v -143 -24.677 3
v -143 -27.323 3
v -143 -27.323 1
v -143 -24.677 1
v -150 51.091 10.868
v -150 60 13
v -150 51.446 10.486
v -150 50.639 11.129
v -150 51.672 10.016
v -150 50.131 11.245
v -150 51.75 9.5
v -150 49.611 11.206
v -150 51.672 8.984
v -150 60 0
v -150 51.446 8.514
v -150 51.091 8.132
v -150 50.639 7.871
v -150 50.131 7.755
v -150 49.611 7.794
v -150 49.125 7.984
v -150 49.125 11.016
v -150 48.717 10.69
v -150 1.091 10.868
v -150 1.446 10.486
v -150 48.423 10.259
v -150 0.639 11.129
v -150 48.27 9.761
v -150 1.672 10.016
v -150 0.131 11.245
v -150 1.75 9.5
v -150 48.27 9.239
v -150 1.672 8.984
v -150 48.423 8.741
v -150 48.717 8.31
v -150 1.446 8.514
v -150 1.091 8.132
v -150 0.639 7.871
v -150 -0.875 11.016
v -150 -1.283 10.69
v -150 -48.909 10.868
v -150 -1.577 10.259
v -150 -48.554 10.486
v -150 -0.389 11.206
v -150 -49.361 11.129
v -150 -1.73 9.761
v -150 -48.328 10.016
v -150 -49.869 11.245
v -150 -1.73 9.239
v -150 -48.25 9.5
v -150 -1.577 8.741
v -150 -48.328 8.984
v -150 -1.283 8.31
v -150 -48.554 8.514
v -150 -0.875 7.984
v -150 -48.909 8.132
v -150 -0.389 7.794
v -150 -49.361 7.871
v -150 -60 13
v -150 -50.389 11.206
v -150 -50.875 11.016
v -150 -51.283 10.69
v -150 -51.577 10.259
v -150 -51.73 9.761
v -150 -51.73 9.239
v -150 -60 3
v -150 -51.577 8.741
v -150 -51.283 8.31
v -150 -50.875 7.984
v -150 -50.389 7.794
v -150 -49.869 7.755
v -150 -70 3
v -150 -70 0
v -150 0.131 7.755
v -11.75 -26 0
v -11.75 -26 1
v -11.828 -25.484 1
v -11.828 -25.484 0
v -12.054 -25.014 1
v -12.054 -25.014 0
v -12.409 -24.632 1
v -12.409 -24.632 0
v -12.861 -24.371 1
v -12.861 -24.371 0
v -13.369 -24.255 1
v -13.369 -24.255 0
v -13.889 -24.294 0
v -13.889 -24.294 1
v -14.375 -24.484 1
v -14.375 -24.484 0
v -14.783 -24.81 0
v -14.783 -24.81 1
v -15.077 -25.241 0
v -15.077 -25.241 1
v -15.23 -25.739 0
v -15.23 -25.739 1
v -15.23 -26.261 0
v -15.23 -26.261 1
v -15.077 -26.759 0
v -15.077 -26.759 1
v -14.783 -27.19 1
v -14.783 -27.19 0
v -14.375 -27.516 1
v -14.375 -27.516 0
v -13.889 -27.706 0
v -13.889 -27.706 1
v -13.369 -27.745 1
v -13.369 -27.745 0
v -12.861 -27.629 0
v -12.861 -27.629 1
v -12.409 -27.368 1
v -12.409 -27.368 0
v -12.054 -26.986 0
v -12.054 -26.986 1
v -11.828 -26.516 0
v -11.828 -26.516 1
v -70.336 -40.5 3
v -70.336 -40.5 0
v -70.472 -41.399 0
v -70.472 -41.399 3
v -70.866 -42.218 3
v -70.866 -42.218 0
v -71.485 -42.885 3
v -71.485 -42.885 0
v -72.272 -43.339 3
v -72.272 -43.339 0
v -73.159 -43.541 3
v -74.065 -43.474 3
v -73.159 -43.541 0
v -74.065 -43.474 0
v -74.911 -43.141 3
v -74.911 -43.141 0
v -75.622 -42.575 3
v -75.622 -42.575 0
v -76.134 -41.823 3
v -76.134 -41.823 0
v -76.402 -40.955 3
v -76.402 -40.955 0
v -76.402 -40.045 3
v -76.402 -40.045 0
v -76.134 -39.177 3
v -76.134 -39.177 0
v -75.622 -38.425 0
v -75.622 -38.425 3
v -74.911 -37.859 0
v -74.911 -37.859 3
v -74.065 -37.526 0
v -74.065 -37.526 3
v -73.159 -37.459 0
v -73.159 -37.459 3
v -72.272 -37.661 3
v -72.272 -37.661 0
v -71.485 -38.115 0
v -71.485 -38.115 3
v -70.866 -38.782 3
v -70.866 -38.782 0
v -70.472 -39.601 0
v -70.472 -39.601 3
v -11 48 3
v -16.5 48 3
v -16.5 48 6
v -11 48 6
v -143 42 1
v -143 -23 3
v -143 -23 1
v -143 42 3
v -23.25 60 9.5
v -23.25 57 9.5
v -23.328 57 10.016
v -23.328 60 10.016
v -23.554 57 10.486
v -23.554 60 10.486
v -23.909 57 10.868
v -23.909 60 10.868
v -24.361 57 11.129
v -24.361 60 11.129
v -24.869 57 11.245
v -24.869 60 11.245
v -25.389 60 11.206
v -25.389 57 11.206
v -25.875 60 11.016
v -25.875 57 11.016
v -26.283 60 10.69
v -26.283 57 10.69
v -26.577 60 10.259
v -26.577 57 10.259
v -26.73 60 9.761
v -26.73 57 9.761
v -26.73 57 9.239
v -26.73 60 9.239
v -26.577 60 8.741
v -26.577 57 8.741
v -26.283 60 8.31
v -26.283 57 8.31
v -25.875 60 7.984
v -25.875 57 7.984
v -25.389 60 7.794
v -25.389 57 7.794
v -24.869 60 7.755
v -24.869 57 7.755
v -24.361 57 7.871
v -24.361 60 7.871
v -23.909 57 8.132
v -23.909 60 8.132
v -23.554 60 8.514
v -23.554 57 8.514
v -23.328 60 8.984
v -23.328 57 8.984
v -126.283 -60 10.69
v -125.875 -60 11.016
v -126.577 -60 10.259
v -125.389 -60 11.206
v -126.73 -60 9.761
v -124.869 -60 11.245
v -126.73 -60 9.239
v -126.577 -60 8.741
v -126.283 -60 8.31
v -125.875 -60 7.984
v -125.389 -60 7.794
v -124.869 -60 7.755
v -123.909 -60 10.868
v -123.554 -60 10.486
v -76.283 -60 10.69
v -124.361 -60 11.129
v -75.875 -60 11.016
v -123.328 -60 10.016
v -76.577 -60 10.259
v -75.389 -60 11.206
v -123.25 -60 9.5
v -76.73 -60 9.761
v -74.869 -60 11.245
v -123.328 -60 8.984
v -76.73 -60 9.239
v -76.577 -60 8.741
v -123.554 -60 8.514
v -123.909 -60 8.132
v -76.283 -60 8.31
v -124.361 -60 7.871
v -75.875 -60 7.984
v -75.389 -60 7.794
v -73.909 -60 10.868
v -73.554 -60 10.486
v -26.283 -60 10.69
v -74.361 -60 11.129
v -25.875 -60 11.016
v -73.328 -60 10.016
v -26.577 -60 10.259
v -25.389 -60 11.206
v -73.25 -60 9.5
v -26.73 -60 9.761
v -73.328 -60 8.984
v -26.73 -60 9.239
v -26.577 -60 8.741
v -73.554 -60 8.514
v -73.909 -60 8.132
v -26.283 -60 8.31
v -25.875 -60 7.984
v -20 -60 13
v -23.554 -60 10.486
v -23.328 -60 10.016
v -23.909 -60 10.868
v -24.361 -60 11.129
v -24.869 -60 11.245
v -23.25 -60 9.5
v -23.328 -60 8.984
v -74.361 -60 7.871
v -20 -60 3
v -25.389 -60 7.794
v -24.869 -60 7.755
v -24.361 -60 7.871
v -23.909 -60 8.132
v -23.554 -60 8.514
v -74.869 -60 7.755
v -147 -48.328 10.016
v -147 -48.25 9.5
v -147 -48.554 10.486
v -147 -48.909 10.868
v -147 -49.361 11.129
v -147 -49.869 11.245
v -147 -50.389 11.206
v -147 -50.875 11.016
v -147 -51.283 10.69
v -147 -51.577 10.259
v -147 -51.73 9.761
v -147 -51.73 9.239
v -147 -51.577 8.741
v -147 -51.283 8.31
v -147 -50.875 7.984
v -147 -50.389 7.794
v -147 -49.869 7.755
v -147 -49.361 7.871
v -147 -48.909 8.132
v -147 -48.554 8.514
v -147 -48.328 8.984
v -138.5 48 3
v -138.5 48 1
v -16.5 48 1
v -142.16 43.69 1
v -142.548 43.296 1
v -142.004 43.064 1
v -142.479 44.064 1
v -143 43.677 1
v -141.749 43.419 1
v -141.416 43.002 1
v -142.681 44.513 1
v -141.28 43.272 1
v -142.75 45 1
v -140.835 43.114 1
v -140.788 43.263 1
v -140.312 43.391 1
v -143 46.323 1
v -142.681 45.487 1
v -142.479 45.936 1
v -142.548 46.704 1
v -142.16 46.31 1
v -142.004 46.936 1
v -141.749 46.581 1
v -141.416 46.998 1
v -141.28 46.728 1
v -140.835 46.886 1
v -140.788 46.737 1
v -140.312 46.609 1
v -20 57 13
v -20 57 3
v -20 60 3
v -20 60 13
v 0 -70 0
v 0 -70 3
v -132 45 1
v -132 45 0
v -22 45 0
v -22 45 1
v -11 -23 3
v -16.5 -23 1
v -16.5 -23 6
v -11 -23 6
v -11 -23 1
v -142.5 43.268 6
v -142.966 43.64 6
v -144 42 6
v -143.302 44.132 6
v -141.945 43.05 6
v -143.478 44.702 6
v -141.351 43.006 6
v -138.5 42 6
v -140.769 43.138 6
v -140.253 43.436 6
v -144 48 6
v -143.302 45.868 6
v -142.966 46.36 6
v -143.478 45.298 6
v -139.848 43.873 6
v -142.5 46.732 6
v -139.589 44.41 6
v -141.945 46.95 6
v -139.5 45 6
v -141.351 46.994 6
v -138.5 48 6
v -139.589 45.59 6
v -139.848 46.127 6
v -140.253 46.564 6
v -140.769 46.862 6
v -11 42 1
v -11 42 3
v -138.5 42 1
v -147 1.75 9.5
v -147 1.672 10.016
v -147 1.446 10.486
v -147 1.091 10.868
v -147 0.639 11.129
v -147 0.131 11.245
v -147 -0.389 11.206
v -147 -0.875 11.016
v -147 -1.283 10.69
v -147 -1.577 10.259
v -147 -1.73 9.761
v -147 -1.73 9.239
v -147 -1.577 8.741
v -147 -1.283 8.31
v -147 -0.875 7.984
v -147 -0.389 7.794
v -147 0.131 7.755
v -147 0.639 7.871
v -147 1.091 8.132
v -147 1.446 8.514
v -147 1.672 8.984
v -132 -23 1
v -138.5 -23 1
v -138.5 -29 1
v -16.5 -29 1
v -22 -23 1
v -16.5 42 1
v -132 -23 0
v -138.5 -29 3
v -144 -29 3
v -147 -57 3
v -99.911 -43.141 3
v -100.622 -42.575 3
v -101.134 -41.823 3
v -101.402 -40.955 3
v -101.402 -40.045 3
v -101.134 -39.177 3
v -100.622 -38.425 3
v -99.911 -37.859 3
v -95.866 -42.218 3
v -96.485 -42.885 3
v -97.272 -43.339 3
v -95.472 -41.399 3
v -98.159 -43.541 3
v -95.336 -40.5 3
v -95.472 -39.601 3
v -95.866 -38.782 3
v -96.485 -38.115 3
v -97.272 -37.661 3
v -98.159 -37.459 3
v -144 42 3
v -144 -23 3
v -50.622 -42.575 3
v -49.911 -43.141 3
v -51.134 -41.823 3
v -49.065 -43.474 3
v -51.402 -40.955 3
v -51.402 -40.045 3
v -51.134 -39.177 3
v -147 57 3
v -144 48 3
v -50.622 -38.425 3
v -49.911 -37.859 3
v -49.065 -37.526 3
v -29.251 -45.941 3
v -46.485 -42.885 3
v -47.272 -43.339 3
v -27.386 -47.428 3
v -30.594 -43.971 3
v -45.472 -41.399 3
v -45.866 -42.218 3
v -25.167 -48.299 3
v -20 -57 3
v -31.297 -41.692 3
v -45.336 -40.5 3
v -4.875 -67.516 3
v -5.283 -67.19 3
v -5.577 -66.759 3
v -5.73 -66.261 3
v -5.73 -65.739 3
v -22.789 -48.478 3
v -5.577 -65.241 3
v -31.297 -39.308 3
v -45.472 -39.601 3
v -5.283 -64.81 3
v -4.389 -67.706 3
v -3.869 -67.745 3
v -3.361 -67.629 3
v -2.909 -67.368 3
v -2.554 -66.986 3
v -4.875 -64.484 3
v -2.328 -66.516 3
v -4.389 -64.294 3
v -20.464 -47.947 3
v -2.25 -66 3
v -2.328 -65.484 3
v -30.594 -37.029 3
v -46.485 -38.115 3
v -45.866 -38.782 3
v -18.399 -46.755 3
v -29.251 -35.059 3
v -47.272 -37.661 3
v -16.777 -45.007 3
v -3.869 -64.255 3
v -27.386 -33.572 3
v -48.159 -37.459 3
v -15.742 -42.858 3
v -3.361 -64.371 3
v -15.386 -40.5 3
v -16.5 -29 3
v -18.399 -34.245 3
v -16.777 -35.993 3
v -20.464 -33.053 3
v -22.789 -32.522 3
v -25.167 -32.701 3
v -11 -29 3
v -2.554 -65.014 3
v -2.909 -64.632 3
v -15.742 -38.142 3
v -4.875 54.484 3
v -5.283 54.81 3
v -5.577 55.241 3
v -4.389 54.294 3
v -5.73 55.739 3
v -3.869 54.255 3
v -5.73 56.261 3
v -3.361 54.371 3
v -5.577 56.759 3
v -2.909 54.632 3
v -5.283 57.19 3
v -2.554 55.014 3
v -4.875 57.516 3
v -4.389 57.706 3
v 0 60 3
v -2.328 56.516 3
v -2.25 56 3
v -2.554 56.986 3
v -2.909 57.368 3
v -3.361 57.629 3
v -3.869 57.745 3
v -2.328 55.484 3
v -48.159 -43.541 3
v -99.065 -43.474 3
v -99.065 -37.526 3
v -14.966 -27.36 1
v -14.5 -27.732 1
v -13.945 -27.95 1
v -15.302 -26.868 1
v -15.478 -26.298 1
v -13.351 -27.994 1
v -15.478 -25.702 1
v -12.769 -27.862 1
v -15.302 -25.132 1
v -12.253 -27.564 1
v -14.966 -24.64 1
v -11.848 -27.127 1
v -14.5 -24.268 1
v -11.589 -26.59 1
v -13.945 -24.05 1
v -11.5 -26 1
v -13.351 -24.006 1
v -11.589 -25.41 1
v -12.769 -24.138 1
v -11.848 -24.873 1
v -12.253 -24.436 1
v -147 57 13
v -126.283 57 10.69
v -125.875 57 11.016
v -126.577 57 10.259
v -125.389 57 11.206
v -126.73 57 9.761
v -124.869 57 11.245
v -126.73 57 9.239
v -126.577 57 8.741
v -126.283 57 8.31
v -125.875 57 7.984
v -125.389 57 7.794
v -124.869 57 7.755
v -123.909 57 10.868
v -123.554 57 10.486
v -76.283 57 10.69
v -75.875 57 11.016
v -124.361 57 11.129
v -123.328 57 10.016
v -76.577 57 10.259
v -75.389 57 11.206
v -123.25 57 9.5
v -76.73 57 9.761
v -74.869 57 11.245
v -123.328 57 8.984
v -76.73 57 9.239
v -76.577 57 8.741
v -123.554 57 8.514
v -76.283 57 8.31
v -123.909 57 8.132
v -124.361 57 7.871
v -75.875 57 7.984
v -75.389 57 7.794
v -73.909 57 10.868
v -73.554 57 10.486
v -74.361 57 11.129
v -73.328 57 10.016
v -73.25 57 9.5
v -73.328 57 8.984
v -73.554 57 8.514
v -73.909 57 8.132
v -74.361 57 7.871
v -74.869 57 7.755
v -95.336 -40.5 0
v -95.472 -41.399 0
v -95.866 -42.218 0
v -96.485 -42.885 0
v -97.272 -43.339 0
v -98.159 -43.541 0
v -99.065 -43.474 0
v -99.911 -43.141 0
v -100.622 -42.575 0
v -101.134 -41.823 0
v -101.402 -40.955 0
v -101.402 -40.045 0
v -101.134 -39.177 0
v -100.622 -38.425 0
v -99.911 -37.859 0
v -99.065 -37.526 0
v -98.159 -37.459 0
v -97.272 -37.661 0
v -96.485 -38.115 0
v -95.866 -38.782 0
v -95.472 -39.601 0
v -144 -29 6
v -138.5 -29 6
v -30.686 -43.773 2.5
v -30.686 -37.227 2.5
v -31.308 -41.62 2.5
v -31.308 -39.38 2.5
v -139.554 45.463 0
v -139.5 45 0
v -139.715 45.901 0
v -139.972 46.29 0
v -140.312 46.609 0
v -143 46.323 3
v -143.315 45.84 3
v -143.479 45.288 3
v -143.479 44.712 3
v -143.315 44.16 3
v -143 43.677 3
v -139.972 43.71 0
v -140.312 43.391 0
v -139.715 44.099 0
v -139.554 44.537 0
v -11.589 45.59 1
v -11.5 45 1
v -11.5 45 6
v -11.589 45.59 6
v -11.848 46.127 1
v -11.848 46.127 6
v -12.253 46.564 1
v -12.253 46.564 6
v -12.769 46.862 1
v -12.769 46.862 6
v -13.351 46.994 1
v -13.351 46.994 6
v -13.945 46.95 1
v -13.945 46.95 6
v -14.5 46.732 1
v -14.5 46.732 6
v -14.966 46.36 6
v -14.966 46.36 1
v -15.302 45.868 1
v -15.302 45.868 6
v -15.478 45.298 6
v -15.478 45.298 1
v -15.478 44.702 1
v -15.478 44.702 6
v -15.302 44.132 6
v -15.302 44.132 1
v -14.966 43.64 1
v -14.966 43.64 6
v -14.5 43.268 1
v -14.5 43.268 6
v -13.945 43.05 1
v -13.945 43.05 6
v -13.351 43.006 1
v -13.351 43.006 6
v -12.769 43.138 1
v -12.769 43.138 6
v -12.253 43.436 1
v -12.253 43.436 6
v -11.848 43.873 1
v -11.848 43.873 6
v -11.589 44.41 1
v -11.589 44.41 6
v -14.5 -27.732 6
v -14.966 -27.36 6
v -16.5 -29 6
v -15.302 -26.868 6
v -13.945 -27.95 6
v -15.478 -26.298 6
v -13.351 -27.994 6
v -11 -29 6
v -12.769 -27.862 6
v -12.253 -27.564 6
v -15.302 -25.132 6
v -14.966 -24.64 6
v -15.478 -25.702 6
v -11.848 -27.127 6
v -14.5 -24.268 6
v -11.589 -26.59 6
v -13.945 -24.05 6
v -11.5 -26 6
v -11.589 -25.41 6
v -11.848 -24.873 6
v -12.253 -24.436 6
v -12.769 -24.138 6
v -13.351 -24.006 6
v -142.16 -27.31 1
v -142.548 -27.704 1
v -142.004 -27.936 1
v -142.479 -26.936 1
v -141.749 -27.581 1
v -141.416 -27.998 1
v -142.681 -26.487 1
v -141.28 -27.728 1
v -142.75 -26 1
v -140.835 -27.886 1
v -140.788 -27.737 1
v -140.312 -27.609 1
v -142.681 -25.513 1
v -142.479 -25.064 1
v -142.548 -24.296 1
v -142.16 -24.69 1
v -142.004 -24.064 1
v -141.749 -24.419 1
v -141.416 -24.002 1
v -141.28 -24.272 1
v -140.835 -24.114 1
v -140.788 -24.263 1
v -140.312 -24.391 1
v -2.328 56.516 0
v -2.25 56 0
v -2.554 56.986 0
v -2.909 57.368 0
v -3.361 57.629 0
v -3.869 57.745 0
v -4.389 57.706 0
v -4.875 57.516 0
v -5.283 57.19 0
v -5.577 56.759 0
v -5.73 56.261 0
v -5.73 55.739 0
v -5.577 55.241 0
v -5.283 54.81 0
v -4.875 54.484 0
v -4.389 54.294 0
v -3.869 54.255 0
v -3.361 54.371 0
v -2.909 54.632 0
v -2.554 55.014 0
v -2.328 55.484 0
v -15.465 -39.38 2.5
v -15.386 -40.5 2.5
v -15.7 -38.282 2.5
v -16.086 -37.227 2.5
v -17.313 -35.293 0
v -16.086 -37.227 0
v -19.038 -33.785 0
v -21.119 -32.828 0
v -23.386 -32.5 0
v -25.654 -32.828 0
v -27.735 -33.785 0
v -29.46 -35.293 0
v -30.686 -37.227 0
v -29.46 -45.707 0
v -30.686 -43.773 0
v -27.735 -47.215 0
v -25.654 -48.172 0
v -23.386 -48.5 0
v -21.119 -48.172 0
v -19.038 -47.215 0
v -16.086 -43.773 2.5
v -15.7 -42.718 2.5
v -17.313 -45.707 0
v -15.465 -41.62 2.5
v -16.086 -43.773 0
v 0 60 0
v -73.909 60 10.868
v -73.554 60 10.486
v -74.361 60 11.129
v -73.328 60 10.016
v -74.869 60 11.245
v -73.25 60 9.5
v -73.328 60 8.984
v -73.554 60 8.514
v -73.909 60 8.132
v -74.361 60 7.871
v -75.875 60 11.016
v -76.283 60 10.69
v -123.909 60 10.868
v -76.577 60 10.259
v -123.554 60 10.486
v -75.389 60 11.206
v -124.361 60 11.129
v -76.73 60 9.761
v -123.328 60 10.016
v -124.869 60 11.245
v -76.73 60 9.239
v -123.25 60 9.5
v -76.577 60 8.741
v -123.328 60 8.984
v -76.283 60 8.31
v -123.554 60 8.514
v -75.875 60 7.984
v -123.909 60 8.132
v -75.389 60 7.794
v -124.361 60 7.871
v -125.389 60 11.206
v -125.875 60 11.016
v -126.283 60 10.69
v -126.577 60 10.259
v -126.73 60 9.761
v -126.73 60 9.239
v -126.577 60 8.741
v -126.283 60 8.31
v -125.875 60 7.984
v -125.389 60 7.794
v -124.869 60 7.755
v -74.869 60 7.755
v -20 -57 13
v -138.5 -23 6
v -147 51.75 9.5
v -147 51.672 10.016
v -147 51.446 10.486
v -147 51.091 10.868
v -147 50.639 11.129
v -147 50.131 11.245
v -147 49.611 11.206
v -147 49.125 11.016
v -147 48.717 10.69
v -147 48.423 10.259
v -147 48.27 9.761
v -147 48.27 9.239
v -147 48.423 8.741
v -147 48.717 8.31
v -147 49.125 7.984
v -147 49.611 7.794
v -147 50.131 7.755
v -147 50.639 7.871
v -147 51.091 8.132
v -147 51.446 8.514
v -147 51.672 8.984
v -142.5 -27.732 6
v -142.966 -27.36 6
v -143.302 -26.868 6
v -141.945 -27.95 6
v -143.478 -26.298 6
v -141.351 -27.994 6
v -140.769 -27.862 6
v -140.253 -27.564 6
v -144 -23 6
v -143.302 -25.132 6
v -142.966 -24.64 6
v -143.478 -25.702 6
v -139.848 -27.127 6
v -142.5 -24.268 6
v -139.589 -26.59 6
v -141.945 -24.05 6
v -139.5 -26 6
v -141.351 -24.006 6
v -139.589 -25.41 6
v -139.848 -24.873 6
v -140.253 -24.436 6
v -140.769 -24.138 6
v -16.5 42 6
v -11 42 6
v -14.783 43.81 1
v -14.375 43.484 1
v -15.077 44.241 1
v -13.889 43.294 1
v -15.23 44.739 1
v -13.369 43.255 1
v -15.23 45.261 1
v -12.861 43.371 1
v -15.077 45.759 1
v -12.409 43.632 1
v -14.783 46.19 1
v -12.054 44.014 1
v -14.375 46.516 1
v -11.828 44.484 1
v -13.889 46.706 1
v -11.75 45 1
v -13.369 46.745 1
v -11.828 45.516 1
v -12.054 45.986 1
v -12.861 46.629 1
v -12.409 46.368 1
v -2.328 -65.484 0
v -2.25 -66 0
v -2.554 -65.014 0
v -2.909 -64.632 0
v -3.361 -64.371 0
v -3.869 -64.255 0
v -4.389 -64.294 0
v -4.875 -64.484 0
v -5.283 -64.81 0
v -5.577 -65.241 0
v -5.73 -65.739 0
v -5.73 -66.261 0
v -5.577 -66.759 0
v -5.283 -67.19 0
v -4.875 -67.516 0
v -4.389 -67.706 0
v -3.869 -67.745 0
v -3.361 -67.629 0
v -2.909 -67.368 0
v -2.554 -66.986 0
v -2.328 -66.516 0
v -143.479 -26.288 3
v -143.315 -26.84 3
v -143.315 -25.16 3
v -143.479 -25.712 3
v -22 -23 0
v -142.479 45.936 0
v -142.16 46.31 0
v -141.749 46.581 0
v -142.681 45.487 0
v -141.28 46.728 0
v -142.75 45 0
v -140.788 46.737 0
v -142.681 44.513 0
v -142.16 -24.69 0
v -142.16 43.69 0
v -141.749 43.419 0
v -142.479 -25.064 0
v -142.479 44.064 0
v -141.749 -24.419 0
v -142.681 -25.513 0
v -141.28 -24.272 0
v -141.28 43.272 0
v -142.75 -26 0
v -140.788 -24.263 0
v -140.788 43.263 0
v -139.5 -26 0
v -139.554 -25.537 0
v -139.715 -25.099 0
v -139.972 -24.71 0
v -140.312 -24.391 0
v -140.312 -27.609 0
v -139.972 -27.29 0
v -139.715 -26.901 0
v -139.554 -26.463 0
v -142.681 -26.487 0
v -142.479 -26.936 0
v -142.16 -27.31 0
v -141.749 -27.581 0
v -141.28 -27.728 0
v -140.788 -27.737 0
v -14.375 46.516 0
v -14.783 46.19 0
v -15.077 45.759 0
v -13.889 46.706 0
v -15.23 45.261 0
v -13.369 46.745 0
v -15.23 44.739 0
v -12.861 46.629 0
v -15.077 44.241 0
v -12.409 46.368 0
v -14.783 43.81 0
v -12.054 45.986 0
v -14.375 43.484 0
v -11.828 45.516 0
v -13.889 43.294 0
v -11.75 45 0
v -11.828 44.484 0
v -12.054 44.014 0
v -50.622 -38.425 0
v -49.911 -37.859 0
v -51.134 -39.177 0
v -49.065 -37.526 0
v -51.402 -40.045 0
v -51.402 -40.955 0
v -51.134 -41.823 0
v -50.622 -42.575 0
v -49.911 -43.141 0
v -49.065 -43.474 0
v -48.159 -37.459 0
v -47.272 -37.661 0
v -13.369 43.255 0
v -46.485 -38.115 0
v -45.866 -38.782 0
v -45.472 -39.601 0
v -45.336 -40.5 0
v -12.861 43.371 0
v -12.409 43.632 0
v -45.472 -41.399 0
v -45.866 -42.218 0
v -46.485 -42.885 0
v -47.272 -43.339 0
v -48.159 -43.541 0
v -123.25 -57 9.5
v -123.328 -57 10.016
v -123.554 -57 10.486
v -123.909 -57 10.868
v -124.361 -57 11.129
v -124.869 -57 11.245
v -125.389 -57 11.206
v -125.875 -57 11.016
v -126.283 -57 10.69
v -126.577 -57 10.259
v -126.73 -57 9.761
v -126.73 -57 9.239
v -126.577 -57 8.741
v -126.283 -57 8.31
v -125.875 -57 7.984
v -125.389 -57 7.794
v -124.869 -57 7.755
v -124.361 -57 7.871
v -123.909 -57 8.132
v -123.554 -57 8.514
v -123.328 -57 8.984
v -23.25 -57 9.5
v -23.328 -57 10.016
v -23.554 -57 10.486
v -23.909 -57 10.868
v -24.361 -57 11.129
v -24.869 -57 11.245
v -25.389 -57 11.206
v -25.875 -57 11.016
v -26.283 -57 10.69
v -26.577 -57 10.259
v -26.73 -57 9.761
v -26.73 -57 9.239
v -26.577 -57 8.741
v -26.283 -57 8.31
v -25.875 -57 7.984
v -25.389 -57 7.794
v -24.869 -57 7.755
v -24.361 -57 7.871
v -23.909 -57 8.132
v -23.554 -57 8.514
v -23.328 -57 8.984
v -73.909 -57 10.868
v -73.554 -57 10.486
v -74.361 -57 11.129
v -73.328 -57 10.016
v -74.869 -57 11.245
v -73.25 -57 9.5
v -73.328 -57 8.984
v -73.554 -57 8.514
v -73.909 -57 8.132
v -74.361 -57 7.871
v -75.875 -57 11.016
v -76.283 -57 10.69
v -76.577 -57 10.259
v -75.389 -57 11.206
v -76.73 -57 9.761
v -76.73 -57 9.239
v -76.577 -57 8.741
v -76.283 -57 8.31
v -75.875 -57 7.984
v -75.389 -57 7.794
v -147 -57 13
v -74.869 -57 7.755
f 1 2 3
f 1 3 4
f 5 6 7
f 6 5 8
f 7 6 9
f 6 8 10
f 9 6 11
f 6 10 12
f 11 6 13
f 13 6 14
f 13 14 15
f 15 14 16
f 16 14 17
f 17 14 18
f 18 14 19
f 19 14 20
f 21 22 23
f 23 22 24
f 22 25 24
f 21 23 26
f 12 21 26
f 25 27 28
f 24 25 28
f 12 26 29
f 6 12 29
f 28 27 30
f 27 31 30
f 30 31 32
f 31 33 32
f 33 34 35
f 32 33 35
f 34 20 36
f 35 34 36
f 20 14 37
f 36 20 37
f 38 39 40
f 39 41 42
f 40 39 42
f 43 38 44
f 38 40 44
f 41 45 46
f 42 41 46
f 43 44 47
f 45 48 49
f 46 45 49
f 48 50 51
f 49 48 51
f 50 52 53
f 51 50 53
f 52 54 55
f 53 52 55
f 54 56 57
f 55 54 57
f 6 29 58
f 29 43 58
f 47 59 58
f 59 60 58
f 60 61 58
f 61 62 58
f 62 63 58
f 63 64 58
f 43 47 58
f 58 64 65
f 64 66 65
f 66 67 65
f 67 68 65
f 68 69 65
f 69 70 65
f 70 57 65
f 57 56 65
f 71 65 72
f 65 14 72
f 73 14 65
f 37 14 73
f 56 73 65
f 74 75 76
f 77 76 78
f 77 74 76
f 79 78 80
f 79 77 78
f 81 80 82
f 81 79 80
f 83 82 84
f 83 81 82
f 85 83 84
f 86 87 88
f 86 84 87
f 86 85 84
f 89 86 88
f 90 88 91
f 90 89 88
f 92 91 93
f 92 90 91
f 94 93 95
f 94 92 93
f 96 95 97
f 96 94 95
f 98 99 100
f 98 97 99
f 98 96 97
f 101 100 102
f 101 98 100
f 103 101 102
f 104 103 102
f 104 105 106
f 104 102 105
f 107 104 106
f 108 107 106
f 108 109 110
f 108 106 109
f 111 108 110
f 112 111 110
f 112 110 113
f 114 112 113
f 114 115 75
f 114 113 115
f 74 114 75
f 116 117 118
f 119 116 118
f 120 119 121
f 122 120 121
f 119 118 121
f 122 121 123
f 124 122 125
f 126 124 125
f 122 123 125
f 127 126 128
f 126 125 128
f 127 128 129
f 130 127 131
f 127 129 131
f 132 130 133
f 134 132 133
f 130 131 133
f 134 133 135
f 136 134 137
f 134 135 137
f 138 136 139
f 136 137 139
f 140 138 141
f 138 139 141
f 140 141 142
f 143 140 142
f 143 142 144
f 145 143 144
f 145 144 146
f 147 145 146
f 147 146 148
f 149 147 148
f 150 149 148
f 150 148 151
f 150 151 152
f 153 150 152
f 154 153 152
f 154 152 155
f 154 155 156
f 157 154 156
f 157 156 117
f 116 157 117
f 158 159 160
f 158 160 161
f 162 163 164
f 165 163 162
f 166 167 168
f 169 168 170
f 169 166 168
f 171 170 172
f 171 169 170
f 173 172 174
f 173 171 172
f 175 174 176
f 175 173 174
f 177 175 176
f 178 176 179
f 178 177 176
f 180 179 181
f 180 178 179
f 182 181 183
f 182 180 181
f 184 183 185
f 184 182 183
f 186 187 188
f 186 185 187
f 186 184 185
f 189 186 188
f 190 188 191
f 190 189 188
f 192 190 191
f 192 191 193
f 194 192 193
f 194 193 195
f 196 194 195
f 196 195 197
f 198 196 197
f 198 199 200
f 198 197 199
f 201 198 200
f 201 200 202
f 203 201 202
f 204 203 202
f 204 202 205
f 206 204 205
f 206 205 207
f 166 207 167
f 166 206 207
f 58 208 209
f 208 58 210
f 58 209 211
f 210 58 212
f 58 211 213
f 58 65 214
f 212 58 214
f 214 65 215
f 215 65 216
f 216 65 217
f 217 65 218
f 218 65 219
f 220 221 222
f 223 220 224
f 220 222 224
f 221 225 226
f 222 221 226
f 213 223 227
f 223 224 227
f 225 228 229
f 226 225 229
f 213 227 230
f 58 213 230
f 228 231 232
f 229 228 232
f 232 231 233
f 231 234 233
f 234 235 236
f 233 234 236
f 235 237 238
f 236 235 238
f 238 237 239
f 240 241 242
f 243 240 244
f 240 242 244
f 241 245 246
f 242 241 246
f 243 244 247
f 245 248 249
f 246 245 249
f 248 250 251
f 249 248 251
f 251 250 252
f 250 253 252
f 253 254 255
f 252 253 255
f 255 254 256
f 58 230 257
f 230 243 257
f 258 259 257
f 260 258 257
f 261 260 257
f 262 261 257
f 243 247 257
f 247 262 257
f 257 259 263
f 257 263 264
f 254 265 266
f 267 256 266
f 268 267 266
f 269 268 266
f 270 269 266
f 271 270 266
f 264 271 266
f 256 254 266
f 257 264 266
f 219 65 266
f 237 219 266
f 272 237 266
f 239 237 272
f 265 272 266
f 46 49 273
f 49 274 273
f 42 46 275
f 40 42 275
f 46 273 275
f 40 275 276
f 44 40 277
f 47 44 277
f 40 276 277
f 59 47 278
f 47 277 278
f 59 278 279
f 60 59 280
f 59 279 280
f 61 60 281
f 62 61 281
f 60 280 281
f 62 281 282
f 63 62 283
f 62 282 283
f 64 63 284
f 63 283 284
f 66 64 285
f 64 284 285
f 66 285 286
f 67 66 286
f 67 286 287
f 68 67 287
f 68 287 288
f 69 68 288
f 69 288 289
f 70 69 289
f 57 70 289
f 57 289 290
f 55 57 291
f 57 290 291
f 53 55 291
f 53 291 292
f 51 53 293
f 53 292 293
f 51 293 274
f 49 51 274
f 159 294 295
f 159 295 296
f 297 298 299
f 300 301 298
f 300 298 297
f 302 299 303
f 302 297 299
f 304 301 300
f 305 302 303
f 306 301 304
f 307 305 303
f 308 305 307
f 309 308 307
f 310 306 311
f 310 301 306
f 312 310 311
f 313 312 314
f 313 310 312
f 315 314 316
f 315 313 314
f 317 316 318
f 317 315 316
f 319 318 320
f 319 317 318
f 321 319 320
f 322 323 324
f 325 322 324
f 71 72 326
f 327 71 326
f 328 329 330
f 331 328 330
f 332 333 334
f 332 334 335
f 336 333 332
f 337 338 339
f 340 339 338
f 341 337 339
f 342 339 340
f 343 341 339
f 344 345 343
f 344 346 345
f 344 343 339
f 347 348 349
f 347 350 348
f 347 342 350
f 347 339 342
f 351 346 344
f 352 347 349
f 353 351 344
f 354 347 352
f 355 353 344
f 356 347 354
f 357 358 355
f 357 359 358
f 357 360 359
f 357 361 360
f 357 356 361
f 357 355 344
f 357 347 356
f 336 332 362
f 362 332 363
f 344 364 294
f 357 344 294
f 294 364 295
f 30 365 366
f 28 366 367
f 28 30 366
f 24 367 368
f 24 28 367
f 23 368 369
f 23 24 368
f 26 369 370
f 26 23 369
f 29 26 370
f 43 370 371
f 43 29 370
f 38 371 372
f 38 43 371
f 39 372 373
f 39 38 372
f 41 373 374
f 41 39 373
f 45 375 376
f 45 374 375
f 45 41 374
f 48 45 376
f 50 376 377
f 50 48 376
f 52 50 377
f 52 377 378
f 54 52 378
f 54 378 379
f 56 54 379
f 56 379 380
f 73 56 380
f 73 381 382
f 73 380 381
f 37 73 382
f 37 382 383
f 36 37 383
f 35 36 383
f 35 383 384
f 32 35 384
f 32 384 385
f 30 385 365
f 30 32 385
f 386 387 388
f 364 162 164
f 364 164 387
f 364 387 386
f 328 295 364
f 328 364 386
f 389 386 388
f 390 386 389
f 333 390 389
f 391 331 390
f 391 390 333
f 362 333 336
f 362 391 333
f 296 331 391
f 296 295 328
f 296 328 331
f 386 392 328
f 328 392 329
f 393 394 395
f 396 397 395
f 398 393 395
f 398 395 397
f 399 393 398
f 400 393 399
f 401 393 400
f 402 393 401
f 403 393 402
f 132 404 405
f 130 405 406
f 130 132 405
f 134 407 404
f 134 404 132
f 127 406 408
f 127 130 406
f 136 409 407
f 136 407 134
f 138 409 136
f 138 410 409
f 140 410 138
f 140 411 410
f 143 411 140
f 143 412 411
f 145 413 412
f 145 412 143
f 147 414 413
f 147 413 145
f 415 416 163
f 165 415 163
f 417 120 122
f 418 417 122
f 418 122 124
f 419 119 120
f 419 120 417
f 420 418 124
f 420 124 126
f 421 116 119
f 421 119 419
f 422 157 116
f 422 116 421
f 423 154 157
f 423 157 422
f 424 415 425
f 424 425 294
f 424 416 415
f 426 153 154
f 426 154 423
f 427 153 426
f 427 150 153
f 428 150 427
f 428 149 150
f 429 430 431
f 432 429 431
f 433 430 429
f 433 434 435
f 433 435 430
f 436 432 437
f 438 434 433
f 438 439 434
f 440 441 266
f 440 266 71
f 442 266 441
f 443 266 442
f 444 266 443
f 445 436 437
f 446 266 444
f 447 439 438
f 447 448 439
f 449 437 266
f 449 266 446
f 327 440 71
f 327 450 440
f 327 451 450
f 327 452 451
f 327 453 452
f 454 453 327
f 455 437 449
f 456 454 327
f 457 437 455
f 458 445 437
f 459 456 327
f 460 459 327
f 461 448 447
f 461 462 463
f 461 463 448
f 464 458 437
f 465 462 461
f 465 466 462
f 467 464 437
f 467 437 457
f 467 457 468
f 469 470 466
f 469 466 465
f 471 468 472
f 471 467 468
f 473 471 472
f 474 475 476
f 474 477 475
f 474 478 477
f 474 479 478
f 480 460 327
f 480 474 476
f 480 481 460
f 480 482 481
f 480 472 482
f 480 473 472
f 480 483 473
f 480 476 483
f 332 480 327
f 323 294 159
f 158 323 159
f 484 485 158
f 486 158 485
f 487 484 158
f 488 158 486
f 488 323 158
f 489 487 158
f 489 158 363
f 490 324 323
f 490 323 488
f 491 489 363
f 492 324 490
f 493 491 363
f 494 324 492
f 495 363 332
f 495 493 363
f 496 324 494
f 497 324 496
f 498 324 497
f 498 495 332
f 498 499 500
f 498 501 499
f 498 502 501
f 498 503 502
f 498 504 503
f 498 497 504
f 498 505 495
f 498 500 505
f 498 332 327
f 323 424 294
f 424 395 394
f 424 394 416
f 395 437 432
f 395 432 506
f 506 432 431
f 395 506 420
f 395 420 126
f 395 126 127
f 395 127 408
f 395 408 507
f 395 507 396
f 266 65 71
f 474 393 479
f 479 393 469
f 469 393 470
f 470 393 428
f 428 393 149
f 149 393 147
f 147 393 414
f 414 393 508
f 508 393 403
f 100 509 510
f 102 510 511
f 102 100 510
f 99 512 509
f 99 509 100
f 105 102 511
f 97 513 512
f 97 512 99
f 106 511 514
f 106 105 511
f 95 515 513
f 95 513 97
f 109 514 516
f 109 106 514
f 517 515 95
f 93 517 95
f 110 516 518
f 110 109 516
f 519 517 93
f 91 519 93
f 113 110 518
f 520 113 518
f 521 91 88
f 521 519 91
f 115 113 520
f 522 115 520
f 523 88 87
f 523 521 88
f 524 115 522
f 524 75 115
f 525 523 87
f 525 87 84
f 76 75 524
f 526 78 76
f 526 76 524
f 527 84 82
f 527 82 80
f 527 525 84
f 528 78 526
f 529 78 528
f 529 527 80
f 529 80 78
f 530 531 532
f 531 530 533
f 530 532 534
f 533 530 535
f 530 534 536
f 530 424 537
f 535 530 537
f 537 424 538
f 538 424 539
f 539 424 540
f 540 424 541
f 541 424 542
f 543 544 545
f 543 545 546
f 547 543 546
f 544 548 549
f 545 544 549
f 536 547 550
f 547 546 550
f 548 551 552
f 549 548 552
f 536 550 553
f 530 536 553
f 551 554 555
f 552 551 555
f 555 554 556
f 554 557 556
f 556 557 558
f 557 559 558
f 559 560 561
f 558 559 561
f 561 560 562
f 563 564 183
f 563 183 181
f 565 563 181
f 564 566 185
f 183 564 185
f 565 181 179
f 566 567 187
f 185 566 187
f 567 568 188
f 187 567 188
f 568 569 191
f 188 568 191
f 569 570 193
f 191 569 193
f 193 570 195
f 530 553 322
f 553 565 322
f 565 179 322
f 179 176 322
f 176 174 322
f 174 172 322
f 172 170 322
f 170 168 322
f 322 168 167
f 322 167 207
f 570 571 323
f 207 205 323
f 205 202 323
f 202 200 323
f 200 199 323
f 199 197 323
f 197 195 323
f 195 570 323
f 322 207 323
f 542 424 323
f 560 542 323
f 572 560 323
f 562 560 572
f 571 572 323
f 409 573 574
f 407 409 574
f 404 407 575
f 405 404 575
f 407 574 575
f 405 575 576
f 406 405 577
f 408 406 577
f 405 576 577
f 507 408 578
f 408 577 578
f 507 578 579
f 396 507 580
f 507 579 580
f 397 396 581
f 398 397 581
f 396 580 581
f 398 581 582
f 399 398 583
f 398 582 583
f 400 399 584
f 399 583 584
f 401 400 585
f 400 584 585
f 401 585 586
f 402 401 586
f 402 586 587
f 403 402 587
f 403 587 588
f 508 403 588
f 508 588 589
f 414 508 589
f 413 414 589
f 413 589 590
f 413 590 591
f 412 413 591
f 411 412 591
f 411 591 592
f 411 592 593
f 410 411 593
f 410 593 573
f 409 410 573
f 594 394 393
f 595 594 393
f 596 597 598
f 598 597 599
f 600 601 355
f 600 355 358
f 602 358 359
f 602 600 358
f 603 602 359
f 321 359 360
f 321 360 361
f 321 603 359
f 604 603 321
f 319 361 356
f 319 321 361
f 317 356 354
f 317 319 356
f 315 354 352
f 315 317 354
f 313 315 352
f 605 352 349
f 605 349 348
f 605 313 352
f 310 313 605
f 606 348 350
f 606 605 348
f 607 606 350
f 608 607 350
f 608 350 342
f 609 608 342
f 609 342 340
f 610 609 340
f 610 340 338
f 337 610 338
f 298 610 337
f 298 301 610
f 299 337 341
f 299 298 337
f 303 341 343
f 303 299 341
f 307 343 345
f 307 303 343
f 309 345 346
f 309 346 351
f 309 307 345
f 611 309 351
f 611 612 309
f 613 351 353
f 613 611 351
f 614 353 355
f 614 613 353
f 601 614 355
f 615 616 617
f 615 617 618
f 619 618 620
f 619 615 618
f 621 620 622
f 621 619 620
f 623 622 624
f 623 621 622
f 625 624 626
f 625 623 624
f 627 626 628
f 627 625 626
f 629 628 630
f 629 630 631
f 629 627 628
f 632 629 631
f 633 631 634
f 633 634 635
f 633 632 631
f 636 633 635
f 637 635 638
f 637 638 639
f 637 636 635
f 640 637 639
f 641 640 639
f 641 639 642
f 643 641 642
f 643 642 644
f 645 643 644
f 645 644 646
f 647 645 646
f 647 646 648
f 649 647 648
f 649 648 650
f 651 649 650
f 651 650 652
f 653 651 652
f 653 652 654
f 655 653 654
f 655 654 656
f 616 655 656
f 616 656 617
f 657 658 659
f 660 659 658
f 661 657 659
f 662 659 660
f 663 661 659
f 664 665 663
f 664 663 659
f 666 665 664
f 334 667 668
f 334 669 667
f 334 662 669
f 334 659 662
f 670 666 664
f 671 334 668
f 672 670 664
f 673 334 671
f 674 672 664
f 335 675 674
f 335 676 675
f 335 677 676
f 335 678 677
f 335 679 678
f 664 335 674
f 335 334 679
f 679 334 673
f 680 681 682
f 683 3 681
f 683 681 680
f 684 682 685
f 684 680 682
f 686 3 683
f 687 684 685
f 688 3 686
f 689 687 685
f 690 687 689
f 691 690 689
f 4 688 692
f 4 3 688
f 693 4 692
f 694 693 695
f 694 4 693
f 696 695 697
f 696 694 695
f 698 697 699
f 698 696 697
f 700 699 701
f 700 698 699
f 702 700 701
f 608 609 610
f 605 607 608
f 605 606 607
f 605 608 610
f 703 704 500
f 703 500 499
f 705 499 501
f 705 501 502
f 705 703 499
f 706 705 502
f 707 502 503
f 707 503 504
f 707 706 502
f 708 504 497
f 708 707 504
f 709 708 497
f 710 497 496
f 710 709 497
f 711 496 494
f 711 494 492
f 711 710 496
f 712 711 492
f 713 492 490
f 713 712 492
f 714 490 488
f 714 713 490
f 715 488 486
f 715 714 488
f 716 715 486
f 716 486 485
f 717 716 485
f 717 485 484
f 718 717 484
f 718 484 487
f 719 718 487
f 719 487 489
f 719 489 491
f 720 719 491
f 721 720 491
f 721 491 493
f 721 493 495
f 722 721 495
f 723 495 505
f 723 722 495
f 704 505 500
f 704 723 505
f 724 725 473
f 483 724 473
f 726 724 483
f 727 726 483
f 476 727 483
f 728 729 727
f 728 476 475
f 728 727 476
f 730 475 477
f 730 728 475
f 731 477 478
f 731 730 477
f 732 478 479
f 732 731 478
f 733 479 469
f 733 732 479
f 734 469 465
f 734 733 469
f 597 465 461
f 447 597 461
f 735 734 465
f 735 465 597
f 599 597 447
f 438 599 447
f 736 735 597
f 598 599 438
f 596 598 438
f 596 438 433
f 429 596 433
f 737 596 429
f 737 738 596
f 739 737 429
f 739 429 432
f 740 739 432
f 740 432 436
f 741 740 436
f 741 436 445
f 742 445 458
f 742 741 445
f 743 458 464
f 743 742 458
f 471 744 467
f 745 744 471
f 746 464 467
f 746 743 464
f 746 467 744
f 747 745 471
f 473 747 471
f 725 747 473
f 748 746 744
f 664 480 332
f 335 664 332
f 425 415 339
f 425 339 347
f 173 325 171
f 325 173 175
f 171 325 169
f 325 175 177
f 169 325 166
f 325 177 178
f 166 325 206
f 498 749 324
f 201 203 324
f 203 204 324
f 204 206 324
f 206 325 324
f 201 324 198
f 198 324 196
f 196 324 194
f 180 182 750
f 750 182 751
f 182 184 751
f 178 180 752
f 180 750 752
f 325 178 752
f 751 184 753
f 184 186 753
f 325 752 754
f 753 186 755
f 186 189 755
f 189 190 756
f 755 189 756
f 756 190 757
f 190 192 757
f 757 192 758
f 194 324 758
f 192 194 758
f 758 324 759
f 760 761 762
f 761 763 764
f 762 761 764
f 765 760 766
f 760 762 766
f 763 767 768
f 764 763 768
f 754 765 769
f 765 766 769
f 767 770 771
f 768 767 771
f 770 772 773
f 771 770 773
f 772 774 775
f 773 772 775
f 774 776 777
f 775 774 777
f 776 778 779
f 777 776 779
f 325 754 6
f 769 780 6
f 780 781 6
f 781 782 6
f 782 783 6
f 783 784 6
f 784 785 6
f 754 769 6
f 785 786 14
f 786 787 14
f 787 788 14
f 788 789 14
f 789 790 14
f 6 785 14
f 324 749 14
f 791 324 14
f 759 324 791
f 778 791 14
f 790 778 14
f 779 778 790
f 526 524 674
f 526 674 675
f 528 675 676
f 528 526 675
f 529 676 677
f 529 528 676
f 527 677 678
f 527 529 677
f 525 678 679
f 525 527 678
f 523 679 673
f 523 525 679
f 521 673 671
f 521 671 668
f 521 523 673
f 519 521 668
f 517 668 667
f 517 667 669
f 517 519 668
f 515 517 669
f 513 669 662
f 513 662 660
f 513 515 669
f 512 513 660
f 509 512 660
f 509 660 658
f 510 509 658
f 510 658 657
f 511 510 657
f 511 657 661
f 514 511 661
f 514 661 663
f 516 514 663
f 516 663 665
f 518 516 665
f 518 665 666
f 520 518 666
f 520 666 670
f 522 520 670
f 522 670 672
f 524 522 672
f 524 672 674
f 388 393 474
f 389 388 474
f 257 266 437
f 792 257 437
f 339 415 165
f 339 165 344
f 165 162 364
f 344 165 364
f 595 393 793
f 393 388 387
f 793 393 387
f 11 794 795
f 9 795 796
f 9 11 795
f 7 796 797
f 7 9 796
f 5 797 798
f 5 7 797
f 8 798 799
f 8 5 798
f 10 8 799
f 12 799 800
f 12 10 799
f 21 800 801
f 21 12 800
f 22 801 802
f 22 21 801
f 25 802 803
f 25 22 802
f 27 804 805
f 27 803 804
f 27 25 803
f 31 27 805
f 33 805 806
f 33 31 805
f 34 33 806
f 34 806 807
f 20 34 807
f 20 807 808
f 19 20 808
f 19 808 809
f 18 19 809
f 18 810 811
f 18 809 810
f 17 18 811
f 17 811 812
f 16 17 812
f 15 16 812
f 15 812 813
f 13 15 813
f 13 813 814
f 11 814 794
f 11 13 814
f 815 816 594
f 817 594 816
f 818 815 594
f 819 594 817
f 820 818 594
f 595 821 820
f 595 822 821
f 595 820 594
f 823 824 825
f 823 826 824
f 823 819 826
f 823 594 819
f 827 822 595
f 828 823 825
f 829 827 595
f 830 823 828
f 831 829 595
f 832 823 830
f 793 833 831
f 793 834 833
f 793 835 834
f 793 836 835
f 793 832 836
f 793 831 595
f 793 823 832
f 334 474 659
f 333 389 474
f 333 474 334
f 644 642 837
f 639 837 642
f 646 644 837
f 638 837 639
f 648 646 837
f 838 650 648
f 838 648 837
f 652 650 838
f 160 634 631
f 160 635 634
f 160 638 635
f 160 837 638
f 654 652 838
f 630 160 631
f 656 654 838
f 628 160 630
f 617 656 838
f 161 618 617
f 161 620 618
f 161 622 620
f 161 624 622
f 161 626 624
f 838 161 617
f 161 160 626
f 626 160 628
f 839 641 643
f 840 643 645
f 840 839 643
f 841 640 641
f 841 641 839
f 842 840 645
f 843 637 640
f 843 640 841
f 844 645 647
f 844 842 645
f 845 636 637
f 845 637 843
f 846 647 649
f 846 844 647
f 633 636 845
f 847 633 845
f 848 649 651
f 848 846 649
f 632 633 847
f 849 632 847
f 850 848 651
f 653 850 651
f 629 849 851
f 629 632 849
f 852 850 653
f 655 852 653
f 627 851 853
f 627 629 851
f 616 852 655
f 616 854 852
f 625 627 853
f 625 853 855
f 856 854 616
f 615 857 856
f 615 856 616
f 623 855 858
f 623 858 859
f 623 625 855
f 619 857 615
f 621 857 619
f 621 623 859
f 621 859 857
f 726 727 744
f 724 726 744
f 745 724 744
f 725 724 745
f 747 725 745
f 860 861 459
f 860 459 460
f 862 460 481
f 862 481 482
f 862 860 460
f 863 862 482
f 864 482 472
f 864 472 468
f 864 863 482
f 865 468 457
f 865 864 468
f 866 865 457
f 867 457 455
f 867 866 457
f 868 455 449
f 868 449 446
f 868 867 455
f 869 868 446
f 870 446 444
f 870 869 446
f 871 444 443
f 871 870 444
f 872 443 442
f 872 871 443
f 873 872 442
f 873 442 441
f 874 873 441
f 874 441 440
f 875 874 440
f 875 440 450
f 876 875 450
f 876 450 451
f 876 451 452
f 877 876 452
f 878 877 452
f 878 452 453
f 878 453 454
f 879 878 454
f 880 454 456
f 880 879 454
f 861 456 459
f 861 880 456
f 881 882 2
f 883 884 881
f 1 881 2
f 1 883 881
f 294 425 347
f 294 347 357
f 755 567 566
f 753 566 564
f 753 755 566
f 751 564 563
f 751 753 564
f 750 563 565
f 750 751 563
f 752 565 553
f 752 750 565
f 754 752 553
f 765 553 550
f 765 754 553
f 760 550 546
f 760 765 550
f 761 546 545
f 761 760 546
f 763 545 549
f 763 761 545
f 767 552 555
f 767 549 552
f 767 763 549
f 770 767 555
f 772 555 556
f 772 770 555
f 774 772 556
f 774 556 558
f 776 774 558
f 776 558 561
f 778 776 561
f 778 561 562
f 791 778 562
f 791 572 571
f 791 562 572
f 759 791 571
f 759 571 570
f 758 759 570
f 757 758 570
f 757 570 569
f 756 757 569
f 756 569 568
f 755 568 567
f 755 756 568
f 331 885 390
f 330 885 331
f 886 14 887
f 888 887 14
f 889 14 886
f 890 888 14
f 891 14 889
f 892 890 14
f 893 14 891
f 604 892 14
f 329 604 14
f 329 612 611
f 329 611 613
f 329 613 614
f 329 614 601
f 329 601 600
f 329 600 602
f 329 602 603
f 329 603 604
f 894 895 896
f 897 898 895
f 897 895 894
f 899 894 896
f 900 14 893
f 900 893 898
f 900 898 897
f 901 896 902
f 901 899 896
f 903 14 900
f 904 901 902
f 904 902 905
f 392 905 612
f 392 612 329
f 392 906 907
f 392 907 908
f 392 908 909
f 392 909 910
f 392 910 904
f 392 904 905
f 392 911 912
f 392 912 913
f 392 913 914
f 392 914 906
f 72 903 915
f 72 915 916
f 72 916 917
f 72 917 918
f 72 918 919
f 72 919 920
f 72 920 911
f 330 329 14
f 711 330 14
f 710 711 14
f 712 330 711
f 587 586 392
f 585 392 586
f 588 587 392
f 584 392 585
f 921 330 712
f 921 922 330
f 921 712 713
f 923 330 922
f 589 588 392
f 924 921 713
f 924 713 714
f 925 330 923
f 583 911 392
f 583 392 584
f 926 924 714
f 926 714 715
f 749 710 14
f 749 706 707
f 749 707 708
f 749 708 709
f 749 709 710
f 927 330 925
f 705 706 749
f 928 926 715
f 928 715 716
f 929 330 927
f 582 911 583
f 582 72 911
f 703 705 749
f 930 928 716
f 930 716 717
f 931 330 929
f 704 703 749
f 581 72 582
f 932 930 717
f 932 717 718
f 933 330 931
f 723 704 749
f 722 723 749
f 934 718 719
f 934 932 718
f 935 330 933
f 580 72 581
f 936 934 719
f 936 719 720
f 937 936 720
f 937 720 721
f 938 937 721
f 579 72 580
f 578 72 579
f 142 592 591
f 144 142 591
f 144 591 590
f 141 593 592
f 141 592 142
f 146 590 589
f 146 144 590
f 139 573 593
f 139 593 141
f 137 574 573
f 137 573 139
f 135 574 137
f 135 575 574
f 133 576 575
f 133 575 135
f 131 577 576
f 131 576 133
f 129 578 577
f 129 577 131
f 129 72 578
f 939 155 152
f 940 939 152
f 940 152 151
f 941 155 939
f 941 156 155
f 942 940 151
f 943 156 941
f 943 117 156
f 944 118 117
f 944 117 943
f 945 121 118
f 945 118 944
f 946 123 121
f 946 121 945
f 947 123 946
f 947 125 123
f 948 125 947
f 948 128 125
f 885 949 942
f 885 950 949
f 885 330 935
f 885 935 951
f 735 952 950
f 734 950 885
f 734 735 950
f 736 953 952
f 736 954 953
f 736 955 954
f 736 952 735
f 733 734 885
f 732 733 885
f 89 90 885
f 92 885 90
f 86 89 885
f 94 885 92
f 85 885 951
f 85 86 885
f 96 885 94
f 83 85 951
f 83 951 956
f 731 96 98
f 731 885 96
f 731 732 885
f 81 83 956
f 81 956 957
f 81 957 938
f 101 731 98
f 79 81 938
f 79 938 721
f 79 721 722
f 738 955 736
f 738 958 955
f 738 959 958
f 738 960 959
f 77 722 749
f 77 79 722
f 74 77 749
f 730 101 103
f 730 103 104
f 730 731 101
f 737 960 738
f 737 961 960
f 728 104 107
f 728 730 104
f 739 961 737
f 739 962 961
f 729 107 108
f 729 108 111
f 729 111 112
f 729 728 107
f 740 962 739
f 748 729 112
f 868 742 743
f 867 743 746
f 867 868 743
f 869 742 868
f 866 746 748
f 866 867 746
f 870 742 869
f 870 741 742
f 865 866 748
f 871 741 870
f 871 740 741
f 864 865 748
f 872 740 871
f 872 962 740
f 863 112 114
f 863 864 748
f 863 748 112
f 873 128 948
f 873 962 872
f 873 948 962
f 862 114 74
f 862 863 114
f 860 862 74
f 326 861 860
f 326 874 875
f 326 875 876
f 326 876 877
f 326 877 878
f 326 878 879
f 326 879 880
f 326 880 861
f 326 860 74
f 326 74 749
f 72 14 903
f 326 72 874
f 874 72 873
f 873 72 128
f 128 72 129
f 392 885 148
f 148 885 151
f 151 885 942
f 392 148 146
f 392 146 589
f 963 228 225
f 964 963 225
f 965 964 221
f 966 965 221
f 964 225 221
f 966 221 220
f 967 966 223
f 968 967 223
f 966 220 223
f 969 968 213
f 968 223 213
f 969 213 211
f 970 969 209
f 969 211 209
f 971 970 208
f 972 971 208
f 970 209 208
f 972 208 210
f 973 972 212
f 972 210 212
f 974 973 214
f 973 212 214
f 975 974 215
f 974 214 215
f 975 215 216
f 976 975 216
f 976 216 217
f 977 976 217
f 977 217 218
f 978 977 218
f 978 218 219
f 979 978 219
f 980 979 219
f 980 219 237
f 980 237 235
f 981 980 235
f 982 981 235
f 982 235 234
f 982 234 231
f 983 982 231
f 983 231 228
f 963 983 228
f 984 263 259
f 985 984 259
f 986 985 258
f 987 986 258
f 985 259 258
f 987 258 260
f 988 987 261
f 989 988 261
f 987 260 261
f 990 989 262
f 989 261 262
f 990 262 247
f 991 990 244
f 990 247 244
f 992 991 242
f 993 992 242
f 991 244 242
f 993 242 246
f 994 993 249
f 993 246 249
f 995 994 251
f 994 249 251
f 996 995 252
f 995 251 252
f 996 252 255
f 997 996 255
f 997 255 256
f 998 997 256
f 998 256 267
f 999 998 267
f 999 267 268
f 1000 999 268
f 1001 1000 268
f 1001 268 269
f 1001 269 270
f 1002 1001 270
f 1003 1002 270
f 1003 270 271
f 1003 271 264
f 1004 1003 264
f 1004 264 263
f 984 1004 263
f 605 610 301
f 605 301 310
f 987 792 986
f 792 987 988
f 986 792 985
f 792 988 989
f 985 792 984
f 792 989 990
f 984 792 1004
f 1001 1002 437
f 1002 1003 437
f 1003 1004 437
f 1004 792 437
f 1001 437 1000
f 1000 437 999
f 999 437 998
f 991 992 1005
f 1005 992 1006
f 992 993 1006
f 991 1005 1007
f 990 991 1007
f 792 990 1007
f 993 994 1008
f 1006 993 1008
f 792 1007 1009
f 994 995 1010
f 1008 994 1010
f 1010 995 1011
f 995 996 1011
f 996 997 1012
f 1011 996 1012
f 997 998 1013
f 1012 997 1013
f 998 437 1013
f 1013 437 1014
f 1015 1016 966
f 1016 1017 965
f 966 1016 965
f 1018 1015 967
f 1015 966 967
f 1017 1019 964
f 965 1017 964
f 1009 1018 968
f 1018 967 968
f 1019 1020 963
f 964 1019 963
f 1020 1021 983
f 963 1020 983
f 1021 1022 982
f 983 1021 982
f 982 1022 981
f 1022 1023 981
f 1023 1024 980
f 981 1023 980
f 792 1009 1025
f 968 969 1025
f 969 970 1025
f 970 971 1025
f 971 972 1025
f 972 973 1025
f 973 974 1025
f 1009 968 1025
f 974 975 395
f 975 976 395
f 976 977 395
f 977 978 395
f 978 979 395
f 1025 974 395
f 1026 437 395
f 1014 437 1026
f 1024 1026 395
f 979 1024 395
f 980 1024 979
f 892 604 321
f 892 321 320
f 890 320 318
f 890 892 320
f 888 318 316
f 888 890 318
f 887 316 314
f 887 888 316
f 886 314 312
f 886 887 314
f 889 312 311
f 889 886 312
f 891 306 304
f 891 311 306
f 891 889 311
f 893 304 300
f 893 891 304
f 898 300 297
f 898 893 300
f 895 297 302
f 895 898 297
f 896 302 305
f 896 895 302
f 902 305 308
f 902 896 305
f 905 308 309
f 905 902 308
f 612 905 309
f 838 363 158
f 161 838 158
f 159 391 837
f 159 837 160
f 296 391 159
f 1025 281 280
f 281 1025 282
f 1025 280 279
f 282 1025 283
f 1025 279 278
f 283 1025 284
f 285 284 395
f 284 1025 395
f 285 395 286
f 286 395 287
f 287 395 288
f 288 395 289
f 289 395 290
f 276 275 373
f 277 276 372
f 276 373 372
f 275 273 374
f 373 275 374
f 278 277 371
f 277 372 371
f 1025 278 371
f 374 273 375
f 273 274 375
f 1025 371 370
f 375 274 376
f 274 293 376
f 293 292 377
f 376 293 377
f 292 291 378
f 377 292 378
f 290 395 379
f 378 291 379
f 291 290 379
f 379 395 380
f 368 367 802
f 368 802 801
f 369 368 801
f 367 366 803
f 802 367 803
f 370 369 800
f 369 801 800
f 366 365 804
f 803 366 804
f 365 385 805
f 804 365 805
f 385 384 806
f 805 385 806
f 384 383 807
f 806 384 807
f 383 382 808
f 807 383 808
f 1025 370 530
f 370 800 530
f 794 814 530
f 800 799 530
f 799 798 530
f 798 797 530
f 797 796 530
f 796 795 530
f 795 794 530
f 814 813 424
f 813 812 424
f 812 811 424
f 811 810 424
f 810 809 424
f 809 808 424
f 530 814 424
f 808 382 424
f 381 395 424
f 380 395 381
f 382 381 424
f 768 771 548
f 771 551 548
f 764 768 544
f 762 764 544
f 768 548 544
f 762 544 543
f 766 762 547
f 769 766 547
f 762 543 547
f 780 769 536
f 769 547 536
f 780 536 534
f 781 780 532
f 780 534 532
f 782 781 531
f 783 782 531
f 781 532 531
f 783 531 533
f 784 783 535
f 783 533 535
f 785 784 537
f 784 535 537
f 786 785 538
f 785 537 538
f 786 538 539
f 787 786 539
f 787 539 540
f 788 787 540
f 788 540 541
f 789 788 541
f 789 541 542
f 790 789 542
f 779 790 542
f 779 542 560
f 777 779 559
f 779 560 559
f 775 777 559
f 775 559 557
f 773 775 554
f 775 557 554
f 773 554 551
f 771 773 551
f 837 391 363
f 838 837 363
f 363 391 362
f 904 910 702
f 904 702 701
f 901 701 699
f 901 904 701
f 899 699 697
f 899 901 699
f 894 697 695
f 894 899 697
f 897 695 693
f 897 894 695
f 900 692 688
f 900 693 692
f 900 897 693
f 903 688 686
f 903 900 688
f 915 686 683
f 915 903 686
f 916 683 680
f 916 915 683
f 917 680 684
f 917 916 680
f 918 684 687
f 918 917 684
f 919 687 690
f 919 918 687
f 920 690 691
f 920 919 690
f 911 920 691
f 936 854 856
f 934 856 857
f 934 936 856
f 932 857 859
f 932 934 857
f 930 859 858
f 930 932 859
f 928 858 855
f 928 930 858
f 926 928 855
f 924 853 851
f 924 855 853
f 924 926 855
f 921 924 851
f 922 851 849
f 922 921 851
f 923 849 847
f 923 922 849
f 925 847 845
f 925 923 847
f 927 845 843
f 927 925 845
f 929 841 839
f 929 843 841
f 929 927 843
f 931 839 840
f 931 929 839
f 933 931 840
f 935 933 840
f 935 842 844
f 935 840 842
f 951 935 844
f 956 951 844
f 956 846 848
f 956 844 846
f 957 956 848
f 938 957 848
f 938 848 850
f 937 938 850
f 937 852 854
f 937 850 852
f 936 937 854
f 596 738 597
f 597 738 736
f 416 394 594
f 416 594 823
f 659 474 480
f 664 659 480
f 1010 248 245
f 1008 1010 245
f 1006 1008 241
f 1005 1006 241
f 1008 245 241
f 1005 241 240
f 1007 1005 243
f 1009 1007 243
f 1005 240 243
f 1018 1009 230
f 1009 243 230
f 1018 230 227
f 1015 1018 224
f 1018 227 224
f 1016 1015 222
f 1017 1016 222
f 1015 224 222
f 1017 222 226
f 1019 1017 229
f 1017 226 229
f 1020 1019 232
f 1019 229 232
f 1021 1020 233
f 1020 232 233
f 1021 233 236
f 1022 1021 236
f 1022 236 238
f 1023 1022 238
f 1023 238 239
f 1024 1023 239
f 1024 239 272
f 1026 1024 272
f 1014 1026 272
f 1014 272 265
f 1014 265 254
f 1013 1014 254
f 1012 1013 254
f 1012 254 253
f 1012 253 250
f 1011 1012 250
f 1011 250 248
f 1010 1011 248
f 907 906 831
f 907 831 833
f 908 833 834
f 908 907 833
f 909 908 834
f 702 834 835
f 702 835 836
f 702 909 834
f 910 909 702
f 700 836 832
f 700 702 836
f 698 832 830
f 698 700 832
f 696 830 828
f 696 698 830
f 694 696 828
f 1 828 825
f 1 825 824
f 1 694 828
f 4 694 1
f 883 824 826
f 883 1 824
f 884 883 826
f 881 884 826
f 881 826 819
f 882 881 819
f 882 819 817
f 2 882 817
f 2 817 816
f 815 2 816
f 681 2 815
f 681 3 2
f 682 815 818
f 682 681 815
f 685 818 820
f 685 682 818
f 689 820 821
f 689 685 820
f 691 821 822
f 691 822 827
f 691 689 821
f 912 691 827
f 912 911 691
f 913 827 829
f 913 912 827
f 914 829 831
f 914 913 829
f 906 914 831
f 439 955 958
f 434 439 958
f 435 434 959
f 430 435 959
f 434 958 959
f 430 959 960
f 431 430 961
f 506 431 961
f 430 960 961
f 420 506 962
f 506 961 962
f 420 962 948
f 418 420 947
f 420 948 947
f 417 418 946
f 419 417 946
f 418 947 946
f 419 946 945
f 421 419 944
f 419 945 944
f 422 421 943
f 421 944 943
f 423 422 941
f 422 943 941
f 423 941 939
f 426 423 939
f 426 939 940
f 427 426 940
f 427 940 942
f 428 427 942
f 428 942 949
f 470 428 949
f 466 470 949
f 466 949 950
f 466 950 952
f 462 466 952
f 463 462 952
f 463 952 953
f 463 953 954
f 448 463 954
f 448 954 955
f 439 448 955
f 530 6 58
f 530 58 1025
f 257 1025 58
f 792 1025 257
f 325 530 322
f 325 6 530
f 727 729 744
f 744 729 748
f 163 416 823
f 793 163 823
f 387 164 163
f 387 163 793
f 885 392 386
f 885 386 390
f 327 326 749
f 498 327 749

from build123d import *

# Parameters (mm, degrees)
SKETCH_W        = 150
SKETCH_H        = 130
SKETCH_R        = 8
SKETCH_R_2      = 1.75
SKETCH_W_2      = 110
SKETCH_H_2      = 68
PAD_DEPTH       = 3
SKETCH002_W     = 132
SKETCH002_H     = 77
POCKET001_DEPTH = 2.5
SKETCH007_W     = 5.5
SKETCH007_H     = 6
SKETCH007_R     = 2
PAD002_DEPTH    = 6
PAD003_DEPTH    = 10
SKETCH010_R     = 1.75
POCKET002_DEPTH = 6
SKETCH011_R     = 1.75
POCKET003_DEPTH = 7.5
SKETCH012_R     = 1.75
POCKET004_DEPTH = 7.5
SKETCH014_W     = 0.7
SKETCH014_H     = 6.545228
PAD004_DEPTH    = 2.5
SKETCH015_R     = 3.05
POCKET_DEPTH    = 13.001
SKETCH016_W     = 0.7
SKETCH016_H     = 6.545228
PAD005_DEPTH    = 2.5


with BuildPart() as part:
    # Sketch → Pad (new body)
    with BuildSketch(Plane.XY):
        with Locations((-75, -5)):
            Rectangle(SKETCH_W, SKETCH_H)
        with Locations((-23.386462, -40.5)):
            Circle(SKETCH_R, mode=Mode.SUBTRACT)
        with Locations((-141, 45)):
            Circle(SKETCH_R_2, mode=Mode.SUBTRACT)
        with Locations((-141, -26)):
            Circle(SKETCH_R_2, mode=Mode.SUBTRACT)
        with Locations((-13.5, 45)):
            Circle(SKETCH_R_2, mode=Mode.SUBTRACT)
        with Locations((-13.5, -26)):
            Circle(SKETCH_R_2, mode=Mode.SUBTRACT)
        with Locations((-4, 56)):
            Circle(SKETCH_R_2, mode=Mode.SUBTRACT)
        with Locations((-4, -66)):
            Circle(SKETCH_R_2, mode=Mode.SUBTRACT)
        with Locations((-77, 11)):
            Rectangle(SKETCH_W_2, SKETCH_H_2, mode=Mode.SUBTRACT)
    extrude(amount=PAD_DEPTH)

    # Sketch002 → Pocket001 (cut)
    with BuildSketch(Plane.XY.offset(3.5)):
        with Locations((-77, 9.5)):
            Rectangle(SKETCH002_W, SKETCH002_H)
    extrude(amount=-POCKET001_DEPTH, mode=Mode.SUBTRACT)

    # Sketch007 → Pad002 (join)
    with BuildSketch(Plane.XY):
        with Locations((-141.25, 45)):
            Rectangle(SKETCH007_W, SKETCH007_H)
        with Locations((-141.5, 45)):
            Circle(SKETCH007_R, mode=Mode.SUBTRACT)
        with Locations((-13.75, 45)):
            Rectangle(SKETCH007_W, SKETCH007_H)
        with Locations((-13.5, 45)):
            Circle(SKETCH007_R, mode=Mode.SUBTRACT)
        with Locations((-13.75, -26)):
            Rectangle(SKETCH007_W, SKETCH007_H)
        with Locations((-13.5, -26)):
            Circle(SKETCH007_R, mode=Mode.SUBTRACT)
        with Locations((-141.25, -26)):
            Rectangle(SKETCH007_W, SKETCH007_H)
        with Locations((-141.5, -26)):
            Circle(SKETCH007_R, mode=Mode.SUBTRACT)
    extrude(amount=PAD002_DEPTH)

    # Sketch003 (on DatumPlane) → Pad003 (join)
    with BuildSketch(Plane.XY.offset(3)):
        Polygon((-20, 60), (-150, 60), (-150, -60), (-20, -60), (-20, -57), (-147, -57), (-147, 57), (-20, 57), align=None)
    extrude(amount=PAD003_DEPTH)

    # Sketch010 → Pocket002 (cut)
    with BuildSketch(Plane.XZ.offset(60)):
        with Locations((-125, 9.5)):
            Circle(SKETCH010_R)
        with Locations((-25, 9.5)):
            Circle(SKETCH010_R)
        with Locations((-75, 9.5)):
            Circle(SKETCH010_R)
    extrude(amount=-POCKET002_DEPTH, mode=Mode.SUBTRACT)

    # Sketch011 → Pocket003 (cut, symmetric)
    with BuildSketch(Plane.XZ.offset(-60)):
        with Locations((-75, 9.5)):
            Circle(SKETCH011_R)
        with Locations((-25, 9.5)):
            Circle(SKETCH011_R)
        with Locations((-125, 9.5)):
            Circle(SKETCH011_R)
    extrude(amount=POCKET003_DEPTH, both=True, mode=Mode.SUBTRACT)

    # Sketch012 (on DatumPlane) → Pocket004 (cut, symmetric)
    with BuildSketch(Plane.YZ.offset(-150)):
        with Locations((0, 9.5)):
            Circle(SKETCH012_R)
        with Locations((50, 9.5)):
            Circle(SKETCH012_R)
        with Locations((-50, 9.5)):
            Circle(SKETCH012_R)
    extrude(amount=POCKET004_DEPTH, both=True, mode=Mode.SUBTRACT)

    # Sketch014 → Pad004 (join)
    with BuildSketch(Plane.XY):
        with Locations((-31.036462, -40.5)):
            Rectangle(SKETCH014_W, SKETCH014_H)
    extrude(amount=PAD004_DEPTH)

    # Sketch015 (on Face4 of Pad004) → Pocket (cut, through all)
    with BuildSketch(Plane(origin=(0, 0, 0), x_dir=(1, 0, 0), z_dir=(0, 0, -1))):
        with Locations((-48.386462, 40.5)):
            Circle(SKETCH015_R)
        with Locations((-73.386462, 40.5)):
            Circle(SKETCH015_R)
        with Locations((-98.386462, 40.5)):
            Circle(SKETCH015_R)
    extrude(amount=-POCKET_DEPTH, mode=Mode.SUBTRACT)

    # Sketch016 (on Face4 of Pocket) → Pad005 (join)
    with BuildSketch(Plane(origin=(0, 0, 0), x_dir=(1, 0, 0), z_dir=(0, 0, -1))):
        with Locations((-15.736462, 40.5)):
            Rectangle(SKETCH016_W, SKETCH016_H)
    extrude(amount=-PAD005_DEPTH)


solid = part.part
